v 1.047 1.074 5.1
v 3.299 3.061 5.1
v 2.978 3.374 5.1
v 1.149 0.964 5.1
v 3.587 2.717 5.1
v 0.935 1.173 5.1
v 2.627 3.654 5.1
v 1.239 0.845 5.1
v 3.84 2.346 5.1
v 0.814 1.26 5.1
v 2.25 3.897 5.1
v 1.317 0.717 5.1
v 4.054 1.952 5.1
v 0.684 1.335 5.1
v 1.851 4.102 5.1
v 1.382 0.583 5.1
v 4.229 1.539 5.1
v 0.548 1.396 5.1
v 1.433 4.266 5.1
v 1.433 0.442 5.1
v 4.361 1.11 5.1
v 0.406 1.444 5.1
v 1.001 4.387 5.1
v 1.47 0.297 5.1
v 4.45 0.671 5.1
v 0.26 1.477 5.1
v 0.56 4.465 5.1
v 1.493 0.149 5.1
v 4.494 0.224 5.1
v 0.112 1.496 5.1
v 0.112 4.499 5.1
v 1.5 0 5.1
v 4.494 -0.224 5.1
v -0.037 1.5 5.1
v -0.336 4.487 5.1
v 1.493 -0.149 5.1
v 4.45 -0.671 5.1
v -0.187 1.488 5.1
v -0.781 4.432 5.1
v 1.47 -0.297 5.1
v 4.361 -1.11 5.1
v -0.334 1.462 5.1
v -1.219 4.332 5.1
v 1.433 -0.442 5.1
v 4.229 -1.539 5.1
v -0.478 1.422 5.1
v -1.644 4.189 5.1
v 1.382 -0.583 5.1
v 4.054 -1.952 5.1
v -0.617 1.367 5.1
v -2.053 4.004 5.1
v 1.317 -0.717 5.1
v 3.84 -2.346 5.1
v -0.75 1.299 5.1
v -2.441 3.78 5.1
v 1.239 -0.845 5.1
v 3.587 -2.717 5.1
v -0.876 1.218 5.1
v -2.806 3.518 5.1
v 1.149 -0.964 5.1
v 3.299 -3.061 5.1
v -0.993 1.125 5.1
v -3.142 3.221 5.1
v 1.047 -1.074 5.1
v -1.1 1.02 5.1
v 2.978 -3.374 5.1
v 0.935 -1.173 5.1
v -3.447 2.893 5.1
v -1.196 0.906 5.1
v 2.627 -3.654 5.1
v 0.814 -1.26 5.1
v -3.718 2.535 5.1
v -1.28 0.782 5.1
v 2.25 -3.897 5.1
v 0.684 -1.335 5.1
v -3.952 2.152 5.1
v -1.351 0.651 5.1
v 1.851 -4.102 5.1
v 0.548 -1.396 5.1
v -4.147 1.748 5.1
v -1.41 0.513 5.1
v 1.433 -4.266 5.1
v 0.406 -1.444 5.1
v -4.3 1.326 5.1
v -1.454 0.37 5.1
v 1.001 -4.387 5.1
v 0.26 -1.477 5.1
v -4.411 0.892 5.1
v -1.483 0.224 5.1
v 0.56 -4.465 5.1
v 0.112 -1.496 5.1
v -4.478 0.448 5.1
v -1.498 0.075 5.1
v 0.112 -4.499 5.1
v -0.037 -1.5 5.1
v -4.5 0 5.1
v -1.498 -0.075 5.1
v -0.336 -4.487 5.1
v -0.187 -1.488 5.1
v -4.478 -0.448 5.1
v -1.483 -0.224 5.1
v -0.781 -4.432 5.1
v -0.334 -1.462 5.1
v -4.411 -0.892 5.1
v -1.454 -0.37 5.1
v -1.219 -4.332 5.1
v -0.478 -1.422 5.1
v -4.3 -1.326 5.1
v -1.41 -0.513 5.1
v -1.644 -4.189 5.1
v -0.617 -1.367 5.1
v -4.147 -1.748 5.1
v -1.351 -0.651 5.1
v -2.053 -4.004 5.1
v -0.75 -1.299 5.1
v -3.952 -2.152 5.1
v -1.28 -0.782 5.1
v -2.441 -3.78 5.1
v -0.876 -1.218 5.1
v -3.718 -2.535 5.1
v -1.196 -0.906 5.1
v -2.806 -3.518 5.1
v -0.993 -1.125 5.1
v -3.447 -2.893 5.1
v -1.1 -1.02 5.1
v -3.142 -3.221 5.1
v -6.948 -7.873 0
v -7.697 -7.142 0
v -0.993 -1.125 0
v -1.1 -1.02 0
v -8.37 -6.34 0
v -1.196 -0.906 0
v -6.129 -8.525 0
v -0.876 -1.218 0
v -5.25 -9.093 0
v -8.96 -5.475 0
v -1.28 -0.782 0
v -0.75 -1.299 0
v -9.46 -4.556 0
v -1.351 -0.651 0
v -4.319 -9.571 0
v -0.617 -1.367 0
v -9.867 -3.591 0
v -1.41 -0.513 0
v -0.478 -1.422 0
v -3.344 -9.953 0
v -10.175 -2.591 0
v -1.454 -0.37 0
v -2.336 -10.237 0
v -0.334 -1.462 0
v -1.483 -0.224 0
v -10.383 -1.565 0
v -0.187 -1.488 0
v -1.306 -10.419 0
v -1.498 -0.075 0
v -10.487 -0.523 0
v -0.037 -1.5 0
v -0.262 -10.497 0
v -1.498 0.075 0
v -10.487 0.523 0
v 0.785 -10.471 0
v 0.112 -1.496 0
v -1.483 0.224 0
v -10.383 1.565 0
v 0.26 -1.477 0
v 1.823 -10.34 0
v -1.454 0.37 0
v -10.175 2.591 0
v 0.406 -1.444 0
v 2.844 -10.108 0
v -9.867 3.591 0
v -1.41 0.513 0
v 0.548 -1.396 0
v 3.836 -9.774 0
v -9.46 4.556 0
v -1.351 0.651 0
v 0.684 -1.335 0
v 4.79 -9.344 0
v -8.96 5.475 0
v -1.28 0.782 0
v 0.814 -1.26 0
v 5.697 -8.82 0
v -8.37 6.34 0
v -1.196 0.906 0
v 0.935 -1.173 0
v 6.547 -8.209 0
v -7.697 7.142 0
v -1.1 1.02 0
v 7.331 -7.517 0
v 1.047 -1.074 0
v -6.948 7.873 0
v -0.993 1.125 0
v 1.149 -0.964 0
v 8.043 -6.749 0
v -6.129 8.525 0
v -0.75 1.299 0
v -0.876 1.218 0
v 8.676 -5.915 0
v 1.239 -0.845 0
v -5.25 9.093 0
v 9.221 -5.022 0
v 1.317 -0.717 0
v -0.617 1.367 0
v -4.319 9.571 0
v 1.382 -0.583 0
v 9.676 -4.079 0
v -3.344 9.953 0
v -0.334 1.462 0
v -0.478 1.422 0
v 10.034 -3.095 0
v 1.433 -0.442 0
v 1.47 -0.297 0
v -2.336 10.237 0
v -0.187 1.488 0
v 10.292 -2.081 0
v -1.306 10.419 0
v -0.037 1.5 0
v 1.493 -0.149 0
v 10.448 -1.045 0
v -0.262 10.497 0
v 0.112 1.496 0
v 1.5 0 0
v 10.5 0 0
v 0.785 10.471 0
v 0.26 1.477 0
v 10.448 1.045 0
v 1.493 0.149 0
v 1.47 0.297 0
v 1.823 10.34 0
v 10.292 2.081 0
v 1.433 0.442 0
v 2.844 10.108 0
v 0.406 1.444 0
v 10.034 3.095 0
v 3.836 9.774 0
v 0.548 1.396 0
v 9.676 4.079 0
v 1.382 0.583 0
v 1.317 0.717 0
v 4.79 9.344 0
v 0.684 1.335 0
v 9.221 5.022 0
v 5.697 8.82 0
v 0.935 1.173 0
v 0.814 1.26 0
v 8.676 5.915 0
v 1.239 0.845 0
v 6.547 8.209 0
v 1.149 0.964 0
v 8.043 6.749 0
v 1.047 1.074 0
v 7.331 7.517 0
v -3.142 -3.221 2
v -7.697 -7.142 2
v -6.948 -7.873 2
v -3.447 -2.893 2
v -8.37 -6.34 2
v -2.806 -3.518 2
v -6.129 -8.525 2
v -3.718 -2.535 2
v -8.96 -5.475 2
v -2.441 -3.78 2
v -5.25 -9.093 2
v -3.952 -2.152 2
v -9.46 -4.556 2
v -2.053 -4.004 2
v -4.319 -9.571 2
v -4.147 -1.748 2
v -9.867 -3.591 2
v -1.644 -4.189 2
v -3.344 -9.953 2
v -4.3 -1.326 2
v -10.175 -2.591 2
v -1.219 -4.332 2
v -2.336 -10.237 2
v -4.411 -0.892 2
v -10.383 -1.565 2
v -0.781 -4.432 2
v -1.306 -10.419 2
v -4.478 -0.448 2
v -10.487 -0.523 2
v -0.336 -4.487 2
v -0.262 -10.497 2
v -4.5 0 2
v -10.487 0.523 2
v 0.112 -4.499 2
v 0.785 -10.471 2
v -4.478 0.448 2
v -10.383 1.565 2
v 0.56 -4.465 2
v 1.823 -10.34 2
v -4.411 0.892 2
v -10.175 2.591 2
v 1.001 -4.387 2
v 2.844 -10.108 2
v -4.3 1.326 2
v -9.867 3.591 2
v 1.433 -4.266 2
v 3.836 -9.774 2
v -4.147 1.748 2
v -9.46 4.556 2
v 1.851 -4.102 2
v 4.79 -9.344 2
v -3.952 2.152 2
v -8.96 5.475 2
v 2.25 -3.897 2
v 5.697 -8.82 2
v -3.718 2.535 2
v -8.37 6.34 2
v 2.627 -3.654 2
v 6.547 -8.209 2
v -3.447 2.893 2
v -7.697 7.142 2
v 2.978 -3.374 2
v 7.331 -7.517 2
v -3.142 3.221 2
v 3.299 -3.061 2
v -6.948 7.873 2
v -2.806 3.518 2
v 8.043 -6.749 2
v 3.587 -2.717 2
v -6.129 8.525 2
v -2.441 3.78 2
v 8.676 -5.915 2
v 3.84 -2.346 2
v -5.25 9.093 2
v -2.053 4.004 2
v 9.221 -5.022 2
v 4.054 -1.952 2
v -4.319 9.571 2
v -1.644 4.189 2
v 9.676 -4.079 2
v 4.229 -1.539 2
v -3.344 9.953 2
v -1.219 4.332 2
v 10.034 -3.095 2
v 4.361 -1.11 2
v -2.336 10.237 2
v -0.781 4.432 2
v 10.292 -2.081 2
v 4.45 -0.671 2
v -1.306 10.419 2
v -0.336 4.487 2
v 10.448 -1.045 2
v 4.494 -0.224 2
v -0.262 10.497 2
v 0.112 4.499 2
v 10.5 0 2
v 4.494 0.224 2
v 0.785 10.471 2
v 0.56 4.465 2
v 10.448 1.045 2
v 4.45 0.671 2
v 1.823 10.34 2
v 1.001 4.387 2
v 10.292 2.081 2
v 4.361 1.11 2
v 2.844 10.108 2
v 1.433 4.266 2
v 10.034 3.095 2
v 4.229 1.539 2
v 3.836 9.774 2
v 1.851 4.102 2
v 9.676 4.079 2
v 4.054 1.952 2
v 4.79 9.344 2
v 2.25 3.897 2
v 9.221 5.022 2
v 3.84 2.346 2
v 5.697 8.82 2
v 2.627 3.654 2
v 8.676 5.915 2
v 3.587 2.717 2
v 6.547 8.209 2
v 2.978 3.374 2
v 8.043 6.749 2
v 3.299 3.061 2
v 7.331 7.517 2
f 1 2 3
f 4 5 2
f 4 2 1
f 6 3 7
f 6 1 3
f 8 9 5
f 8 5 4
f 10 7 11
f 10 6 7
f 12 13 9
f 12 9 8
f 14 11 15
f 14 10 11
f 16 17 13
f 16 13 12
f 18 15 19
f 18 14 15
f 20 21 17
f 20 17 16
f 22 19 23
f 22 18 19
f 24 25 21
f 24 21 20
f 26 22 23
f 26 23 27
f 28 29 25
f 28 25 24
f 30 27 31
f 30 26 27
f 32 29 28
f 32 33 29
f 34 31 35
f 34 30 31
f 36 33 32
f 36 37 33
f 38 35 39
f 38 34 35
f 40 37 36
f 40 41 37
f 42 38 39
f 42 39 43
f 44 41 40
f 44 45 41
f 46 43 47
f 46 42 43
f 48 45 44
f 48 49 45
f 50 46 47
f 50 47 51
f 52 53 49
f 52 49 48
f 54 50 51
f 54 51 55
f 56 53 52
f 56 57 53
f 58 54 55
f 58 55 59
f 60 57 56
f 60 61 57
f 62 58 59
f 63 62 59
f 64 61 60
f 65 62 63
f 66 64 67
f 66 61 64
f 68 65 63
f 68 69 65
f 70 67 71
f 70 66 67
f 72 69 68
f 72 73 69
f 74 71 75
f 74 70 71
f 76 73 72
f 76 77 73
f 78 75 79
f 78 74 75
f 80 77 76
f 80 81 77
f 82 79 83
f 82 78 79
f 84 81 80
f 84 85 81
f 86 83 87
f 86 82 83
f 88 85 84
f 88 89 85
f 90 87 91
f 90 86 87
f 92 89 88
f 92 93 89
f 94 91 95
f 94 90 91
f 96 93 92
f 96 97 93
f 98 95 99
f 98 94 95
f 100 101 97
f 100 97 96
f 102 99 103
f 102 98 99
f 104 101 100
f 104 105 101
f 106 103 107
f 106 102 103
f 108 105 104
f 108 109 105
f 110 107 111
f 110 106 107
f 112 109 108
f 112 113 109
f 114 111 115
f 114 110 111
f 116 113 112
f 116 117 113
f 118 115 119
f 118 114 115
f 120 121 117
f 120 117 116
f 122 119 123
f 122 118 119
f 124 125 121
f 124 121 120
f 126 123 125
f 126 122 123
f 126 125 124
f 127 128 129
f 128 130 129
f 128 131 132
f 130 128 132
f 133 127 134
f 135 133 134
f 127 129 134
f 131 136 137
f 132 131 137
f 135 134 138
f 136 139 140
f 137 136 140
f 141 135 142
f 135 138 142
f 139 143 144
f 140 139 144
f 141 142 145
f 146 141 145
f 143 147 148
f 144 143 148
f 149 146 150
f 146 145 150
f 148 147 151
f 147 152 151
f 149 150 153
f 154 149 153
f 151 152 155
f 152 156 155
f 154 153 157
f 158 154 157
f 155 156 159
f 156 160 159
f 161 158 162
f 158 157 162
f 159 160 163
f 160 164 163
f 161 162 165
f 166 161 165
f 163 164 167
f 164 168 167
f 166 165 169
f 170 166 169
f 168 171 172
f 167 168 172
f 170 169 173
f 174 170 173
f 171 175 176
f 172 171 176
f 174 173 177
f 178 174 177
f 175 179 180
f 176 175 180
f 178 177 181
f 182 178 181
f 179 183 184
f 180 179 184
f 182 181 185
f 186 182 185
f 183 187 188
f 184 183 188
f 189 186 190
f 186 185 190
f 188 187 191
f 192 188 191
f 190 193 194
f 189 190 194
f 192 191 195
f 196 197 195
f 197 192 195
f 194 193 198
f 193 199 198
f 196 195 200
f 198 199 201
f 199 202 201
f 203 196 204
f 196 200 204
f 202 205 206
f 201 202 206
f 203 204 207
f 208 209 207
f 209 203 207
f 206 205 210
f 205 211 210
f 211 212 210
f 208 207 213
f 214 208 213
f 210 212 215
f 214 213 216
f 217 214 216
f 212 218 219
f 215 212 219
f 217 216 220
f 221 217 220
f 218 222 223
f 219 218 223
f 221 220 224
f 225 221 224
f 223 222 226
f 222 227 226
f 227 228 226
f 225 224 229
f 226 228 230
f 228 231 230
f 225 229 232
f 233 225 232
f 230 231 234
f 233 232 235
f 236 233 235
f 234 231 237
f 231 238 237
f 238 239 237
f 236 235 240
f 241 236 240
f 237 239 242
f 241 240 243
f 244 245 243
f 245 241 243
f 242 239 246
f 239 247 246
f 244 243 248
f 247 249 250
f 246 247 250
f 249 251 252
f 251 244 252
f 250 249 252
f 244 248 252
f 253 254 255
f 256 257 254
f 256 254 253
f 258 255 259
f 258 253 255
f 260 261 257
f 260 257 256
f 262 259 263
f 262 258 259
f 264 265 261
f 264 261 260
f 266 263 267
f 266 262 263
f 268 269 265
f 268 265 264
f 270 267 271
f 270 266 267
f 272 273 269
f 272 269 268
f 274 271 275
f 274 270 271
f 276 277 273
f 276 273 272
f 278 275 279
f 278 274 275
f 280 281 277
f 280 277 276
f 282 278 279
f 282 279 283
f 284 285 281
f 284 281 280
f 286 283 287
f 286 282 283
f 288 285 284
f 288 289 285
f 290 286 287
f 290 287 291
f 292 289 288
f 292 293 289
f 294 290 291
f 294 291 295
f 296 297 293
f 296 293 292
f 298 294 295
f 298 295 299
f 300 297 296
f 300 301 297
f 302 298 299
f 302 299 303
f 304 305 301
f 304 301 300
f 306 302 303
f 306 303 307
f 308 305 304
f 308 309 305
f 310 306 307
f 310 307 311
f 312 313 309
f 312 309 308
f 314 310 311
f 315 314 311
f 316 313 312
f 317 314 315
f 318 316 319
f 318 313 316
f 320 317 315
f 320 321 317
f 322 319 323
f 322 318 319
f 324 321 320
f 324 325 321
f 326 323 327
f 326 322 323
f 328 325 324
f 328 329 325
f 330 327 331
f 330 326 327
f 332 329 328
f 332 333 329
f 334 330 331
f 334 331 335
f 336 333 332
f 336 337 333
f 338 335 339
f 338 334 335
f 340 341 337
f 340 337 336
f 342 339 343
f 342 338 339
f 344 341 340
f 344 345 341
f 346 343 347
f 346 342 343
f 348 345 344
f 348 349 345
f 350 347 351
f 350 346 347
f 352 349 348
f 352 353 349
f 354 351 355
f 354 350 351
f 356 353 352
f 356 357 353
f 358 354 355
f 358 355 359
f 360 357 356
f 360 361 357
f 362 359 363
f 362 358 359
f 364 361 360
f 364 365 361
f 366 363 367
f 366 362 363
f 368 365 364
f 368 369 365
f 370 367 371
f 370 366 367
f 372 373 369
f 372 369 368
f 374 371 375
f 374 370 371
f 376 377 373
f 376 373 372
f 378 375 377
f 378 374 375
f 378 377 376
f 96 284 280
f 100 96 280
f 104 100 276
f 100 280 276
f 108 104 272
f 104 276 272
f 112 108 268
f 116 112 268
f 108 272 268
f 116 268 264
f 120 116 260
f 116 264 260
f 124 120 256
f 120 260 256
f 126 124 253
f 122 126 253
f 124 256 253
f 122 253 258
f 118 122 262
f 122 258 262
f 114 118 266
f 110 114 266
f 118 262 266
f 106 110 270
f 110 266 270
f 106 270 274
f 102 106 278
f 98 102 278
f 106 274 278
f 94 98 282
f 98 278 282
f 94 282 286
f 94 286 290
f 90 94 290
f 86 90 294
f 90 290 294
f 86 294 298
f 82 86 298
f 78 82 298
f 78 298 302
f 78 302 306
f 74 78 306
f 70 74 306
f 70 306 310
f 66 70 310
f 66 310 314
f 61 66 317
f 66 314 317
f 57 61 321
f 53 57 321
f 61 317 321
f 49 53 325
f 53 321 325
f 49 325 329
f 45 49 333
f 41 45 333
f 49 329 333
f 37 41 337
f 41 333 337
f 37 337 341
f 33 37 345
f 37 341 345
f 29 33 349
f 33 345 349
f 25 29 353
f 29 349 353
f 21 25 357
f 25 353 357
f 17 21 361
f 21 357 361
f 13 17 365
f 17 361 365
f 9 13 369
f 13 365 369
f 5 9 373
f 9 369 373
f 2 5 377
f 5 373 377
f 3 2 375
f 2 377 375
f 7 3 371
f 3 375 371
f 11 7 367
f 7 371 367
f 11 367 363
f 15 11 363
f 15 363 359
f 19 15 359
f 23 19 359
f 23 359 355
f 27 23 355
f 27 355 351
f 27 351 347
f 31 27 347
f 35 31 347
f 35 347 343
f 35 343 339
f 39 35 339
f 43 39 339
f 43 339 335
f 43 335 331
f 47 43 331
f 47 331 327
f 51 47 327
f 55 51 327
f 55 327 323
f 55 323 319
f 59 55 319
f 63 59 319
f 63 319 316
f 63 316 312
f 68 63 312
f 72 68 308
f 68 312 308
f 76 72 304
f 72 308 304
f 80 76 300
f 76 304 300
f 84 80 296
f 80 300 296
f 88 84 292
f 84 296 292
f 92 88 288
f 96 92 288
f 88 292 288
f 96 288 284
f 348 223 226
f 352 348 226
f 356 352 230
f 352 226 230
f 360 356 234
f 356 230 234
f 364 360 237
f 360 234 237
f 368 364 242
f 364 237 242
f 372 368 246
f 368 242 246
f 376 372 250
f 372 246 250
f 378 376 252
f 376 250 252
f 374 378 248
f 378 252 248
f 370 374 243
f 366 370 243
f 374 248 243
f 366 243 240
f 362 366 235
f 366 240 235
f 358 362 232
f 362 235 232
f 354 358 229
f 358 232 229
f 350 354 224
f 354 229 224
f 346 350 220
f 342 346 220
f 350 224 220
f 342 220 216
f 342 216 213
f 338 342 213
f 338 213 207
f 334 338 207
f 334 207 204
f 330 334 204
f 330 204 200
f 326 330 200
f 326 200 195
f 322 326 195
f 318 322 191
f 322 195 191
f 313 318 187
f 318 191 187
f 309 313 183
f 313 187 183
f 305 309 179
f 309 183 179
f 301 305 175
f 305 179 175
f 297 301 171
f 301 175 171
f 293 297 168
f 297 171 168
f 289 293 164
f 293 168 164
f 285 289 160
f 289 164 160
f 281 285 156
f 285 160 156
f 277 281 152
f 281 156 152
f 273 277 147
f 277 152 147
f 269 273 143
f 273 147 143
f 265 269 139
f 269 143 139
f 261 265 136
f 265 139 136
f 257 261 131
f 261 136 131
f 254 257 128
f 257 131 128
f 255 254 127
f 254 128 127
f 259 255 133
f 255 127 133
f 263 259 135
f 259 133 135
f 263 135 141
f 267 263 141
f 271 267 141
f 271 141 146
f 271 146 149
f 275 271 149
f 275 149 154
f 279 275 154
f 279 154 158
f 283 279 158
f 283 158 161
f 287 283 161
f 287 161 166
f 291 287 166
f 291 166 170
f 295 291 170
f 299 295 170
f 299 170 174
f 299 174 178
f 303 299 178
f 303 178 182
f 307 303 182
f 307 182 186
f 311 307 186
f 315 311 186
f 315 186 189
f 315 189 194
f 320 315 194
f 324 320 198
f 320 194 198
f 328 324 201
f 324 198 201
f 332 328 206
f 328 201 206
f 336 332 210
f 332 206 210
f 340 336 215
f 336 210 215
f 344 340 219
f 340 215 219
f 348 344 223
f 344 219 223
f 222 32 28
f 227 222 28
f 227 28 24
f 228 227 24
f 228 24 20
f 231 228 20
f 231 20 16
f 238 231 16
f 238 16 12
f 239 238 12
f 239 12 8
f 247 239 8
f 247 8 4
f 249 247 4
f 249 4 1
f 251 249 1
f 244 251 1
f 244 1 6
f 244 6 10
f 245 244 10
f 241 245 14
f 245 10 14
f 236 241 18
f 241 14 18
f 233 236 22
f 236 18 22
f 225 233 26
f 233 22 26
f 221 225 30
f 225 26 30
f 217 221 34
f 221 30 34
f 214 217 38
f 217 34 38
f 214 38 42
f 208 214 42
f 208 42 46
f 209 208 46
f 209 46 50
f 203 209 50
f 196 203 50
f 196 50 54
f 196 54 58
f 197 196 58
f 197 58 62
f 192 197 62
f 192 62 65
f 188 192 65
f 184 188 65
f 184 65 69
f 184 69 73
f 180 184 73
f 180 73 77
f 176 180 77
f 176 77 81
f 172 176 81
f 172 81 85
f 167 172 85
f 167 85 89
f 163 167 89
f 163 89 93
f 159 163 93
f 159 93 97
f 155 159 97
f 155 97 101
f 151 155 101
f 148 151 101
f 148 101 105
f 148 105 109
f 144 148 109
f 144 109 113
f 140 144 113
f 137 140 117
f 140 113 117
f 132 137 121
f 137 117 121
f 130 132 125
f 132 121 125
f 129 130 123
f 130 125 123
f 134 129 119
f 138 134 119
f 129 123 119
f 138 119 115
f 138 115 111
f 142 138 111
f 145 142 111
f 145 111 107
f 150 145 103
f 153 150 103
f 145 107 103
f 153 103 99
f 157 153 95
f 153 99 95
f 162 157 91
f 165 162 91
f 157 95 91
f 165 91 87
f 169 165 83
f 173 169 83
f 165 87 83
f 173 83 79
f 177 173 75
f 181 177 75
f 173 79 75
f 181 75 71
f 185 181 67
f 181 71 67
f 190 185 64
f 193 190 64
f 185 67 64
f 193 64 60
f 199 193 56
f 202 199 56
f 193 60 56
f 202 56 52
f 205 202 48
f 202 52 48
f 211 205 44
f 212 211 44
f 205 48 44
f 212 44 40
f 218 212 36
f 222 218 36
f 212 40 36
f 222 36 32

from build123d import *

# Parameters (mm, degrees)
CROQUIS1_R              = 10.5
SALIENTE_EXTRUIR1_DEPTH = 2
CROQUIS2_R              = 4.5
SALIENTE_EXTRUIR2_DEPTH = 3.1
CORTAR_EXTRUIR1_REACH   = 17.701
CROQUIS3_R              = 1.5


with BuildPart() as part:
    # Croquis1 → Saliente-Extruir1 (new body)
    with BuildSketch(Plane.XY):
        Circle(CROQUIS1_R)
    extrude(amount=SALIENTE_EXTRUIR1_DEPTH)

    # Croquis2 → Saliente-Extruir2 (add)
    with BuildSketch(Plane.XY.offset(2)):
        with Locations(Location((0, 0, 0), (0, 0, 180))):
            Circle(CROQUIS2_R)
    extrude(amount=SALIENTE_EXTRUIR2_DEPTH)

    # Croquis3 → Cortar-Extruir1 (cut, up to next)
    with BuildSketch(Plane.XY.offset(5.1), mode=Mode.PRIVATE) as cortar_extruir1_sk1:
        Circle(CROQUIS3_R)
    cortar_extruir1_tool1 = extrude(cortar_extruir1_sk1.sketch, amount=-CORTAR_EXTRUIR1_REACH, mode=Mode.PRIVATE) & part.part
    add(cortar_extruir1_tool1.solids().sort_by_distance((0, 0, 5.1))[0], mode=Mode.SUBTRACT)


solid = part.part
